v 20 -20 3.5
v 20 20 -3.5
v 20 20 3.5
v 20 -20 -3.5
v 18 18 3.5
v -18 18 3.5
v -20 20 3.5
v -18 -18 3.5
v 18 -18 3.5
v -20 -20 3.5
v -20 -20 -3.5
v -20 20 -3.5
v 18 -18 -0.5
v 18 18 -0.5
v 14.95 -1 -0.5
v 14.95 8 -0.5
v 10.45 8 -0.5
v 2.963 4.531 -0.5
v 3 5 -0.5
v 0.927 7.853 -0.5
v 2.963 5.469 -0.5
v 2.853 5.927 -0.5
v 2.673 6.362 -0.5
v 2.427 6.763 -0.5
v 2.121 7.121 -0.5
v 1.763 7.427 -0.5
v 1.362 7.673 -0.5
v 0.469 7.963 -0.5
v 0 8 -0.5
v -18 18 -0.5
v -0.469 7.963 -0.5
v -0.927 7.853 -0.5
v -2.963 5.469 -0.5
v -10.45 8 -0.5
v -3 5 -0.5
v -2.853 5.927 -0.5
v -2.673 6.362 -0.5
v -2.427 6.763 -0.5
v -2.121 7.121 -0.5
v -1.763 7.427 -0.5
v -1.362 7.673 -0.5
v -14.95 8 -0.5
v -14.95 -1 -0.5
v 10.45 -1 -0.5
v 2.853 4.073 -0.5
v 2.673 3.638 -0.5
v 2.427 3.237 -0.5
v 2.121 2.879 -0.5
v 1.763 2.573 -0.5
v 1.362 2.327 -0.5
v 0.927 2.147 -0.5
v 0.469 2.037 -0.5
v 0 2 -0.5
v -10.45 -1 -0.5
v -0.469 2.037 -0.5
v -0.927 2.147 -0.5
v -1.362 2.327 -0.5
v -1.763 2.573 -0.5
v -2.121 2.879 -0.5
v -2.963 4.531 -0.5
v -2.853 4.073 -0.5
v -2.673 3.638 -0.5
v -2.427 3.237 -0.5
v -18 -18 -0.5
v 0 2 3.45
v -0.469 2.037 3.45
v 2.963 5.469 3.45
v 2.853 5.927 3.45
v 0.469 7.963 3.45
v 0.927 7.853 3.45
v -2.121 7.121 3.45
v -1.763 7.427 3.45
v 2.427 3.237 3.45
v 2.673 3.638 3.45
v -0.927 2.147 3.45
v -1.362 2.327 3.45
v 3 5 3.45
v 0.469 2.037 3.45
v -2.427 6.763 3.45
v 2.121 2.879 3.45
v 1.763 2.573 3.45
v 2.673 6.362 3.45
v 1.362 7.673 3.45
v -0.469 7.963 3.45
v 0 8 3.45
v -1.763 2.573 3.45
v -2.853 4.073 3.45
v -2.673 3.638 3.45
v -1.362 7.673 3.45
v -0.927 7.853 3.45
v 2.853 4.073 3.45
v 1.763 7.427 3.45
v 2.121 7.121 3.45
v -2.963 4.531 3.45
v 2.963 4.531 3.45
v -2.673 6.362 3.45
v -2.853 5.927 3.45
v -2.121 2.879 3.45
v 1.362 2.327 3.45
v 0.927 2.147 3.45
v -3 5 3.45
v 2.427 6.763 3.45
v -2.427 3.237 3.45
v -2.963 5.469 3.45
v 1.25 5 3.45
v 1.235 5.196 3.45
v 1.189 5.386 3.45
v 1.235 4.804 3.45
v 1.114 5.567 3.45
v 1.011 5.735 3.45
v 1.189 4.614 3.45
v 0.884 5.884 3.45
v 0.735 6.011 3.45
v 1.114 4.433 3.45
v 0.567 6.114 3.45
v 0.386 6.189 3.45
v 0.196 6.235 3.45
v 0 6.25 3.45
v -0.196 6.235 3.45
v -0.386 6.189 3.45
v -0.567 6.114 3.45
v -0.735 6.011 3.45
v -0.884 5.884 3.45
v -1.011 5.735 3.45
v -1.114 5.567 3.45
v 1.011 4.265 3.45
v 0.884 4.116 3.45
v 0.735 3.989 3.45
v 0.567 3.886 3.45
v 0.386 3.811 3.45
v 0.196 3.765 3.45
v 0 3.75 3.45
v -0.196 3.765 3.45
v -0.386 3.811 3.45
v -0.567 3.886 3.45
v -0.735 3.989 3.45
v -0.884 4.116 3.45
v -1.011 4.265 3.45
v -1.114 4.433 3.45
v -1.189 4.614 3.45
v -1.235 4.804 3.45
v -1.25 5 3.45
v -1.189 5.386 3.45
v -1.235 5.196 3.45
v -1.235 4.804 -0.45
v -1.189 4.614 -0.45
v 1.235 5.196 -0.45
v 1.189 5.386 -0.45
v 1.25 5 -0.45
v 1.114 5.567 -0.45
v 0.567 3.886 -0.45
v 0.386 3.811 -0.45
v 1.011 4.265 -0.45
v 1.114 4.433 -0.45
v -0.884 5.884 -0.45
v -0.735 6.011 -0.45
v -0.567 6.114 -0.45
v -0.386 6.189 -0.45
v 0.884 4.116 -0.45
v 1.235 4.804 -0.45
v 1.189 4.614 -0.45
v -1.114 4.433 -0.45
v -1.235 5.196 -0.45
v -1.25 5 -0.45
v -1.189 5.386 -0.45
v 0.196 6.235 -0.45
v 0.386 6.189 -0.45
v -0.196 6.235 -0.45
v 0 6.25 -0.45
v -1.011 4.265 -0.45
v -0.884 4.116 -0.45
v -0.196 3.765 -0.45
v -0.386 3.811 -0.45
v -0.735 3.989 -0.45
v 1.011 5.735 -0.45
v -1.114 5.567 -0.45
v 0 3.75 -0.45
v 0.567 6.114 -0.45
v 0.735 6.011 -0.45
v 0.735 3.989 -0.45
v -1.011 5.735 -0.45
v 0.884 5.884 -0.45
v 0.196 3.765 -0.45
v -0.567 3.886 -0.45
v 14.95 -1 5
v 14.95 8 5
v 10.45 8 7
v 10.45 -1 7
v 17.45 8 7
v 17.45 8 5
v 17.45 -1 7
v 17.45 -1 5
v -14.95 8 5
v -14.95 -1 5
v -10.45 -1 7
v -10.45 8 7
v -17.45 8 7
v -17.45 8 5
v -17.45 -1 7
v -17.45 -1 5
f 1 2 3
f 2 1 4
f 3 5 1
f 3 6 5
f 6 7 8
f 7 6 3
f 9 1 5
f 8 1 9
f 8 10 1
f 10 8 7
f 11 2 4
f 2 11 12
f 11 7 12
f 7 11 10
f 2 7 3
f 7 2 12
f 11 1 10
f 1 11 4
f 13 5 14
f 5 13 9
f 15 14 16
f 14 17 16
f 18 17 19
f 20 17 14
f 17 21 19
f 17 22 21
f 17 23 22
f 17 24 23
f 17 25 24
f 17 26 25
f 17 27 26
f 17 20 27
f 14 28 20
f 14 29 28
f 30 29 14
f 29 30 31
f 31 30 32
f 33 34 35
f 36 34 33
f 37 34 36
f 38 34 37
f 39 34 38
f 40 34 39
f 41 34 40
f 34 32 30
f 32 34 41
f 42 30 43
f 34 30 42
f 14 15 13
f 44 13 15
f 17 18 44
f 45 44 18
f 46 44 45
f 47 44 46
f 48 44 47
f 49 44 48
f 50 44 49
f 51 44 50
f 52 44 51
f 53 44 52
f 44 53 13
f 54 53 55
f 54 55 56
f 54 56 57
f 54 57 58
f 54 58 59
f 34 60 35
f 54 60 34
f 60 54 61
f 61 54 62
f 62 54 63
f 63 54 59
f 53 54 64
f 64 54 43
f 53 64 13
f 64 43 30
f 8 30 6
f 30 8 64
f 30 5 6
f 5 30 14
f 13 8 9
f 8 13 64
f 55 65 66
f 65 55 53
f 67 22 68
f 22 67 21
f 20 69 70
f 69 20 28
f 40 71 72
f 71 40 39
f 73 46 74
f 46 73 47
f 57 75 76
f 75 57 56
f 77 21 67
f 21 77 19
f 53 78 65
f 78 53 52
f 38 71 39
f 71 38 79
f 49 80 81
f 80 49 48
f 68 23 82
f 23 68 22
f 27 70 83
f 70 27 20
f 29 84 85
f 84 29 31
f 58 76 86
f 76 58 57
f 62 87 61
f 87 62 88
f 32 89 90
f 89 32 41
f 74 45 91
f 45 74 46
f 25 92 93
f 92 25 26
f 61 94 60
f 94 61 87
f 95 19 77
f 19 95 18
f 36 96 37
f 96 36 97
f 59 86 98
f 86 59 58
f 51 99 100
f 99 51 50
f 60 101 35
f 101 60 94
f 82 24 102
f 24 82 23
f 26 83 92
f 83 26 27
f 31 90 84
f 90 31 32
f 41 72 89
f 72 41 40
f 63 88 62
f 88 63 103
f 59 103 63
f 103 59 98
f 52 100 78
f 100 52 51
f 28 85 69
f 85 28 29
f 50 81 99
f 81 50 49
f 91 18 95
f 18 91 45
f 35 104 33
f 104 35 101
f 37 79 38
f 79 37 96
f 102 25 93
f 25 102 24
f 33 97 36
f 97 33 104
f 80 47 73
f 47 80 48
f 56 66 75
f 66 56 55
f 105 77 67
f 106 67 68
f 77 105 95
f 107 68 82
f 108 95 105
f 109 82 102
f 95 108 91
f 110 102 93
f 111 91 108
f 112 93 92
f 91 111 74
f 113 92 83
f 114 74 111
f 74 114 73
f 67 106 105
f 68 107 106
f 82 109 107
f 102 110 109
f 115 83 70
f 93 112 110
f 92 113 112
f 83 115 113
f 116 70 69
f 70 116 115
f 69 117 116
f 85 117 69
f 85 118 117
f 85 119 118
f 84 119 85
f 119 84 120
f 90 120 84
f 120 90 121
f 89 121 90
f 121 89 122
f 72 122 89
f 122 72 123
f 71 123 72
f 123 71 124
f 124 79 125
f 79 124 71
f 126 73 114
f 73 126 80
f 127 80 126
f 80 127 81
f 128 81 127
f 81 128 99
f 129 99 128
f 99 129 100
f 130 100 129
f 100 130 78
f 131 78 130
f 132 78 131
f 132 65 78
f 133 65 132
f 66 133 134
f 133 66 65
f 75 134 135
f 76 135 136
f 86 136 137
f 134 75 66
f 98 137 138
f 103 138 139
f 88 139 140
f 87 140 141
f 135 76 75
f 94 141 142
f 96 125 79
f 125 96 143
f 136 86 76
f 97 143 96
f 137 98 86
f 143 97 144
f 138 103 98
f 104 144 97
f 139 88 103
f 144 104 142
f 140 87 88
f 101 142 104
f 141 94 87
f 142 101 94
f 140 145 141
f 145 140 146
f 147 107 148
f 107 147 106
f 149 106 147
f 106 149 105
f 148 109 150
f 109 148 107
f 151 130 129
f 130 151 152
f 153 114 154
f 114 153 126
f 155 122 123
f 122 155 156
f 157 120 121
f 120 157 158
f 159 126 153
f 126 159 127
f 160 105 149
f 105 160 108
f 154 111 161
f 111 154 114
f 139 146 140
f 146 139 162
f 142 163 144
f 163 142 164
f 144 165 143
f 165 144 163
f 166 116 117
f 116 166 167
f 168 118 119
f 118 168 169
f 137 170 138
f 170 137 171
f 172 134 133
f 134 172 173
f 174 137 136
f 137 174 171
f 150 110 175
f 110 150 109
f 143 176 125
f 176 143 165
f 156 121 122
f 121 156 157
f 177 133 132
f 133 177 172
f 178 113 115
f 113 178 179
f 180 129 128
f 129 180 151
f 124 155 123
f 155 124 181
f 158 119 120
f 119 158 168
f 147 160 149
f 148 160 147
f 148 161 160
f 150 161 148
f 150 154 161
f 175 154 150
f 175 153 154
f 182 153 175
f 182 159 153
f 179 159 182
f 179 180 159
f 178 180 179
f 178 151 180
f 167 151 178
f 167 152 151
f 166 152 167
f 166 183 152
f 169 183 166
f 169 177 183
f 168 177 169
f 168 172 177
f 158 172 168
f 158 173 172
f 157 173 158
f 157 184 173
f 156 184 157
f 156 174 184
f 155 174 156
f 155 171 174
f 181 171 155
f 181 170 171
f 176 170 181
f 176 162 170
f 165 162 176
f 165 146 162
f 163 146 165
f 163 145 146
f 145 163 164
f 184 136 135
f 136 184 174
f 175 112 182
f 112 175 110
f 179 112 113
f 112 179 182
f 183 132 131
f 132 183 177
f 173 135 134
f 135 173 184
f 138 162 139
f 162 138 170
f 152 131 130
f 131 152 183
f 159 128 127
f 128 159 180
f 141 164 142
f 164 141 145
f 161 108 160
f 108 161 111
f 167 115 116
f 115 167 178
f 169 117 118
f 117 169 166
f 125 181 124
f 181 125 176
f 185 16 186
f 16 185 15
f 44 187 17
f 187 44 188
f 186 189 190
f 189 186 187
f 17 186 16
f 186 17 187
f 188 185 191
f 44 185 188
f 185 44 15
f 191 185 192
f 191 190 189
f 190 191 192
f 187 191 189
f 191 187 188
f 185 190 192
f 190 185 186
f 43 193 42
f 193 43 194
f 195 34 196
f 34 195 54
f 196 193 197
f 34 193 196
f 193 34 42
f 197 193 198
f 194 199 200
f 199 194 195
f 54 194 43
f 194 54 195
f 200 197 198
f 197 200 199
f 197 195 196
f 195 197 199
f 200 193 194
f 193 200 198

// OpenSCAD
/*

HP 5512A (and similar cases) foot replacement.

NOTES

The original was also featuring a small "edge" or "lip" on the bottom so you could stack devices. 

It also featured a spring loaded button that locked into the center part.

This simple replacement is "friction fit" which means that you might need to "tune" it with a small file or sandpaper, so print one at first and see if and where it is too tight based on your printer.abs


*/

$fn = 40;

module Clamp()
{
    translate([0,0,1.6])
        cube([4.5,9,10], center=true);
    // 1.5mm sheet metal...
    translate([2.5/2,0,6])
        cube([7,9,2], center=true);
}

module Foot()
{
    
    union()
    {
        difference()
        {
            cube([40,40,7], center=true);
            translate([0,0,2])
                cube([36,36,5], center=true);
        }
        // 30.5  20.6
        translate([0,5.0,0])
            difference()
            {
                cylinder(h=6.9, d=6, center=true);
                translate([0,0,3])  
                        cylinder(h=6.9, d=2.5, center=true);
            }
        translate([12.7,3.5,0])
            Clamp();
        scale([-1,1,1])
            translate([12.7,3.5,0])
                Clamp();
    }
}



Foot();

//color("blue") translate([0,0,4]) cube([30.5,1,1], center=true);
